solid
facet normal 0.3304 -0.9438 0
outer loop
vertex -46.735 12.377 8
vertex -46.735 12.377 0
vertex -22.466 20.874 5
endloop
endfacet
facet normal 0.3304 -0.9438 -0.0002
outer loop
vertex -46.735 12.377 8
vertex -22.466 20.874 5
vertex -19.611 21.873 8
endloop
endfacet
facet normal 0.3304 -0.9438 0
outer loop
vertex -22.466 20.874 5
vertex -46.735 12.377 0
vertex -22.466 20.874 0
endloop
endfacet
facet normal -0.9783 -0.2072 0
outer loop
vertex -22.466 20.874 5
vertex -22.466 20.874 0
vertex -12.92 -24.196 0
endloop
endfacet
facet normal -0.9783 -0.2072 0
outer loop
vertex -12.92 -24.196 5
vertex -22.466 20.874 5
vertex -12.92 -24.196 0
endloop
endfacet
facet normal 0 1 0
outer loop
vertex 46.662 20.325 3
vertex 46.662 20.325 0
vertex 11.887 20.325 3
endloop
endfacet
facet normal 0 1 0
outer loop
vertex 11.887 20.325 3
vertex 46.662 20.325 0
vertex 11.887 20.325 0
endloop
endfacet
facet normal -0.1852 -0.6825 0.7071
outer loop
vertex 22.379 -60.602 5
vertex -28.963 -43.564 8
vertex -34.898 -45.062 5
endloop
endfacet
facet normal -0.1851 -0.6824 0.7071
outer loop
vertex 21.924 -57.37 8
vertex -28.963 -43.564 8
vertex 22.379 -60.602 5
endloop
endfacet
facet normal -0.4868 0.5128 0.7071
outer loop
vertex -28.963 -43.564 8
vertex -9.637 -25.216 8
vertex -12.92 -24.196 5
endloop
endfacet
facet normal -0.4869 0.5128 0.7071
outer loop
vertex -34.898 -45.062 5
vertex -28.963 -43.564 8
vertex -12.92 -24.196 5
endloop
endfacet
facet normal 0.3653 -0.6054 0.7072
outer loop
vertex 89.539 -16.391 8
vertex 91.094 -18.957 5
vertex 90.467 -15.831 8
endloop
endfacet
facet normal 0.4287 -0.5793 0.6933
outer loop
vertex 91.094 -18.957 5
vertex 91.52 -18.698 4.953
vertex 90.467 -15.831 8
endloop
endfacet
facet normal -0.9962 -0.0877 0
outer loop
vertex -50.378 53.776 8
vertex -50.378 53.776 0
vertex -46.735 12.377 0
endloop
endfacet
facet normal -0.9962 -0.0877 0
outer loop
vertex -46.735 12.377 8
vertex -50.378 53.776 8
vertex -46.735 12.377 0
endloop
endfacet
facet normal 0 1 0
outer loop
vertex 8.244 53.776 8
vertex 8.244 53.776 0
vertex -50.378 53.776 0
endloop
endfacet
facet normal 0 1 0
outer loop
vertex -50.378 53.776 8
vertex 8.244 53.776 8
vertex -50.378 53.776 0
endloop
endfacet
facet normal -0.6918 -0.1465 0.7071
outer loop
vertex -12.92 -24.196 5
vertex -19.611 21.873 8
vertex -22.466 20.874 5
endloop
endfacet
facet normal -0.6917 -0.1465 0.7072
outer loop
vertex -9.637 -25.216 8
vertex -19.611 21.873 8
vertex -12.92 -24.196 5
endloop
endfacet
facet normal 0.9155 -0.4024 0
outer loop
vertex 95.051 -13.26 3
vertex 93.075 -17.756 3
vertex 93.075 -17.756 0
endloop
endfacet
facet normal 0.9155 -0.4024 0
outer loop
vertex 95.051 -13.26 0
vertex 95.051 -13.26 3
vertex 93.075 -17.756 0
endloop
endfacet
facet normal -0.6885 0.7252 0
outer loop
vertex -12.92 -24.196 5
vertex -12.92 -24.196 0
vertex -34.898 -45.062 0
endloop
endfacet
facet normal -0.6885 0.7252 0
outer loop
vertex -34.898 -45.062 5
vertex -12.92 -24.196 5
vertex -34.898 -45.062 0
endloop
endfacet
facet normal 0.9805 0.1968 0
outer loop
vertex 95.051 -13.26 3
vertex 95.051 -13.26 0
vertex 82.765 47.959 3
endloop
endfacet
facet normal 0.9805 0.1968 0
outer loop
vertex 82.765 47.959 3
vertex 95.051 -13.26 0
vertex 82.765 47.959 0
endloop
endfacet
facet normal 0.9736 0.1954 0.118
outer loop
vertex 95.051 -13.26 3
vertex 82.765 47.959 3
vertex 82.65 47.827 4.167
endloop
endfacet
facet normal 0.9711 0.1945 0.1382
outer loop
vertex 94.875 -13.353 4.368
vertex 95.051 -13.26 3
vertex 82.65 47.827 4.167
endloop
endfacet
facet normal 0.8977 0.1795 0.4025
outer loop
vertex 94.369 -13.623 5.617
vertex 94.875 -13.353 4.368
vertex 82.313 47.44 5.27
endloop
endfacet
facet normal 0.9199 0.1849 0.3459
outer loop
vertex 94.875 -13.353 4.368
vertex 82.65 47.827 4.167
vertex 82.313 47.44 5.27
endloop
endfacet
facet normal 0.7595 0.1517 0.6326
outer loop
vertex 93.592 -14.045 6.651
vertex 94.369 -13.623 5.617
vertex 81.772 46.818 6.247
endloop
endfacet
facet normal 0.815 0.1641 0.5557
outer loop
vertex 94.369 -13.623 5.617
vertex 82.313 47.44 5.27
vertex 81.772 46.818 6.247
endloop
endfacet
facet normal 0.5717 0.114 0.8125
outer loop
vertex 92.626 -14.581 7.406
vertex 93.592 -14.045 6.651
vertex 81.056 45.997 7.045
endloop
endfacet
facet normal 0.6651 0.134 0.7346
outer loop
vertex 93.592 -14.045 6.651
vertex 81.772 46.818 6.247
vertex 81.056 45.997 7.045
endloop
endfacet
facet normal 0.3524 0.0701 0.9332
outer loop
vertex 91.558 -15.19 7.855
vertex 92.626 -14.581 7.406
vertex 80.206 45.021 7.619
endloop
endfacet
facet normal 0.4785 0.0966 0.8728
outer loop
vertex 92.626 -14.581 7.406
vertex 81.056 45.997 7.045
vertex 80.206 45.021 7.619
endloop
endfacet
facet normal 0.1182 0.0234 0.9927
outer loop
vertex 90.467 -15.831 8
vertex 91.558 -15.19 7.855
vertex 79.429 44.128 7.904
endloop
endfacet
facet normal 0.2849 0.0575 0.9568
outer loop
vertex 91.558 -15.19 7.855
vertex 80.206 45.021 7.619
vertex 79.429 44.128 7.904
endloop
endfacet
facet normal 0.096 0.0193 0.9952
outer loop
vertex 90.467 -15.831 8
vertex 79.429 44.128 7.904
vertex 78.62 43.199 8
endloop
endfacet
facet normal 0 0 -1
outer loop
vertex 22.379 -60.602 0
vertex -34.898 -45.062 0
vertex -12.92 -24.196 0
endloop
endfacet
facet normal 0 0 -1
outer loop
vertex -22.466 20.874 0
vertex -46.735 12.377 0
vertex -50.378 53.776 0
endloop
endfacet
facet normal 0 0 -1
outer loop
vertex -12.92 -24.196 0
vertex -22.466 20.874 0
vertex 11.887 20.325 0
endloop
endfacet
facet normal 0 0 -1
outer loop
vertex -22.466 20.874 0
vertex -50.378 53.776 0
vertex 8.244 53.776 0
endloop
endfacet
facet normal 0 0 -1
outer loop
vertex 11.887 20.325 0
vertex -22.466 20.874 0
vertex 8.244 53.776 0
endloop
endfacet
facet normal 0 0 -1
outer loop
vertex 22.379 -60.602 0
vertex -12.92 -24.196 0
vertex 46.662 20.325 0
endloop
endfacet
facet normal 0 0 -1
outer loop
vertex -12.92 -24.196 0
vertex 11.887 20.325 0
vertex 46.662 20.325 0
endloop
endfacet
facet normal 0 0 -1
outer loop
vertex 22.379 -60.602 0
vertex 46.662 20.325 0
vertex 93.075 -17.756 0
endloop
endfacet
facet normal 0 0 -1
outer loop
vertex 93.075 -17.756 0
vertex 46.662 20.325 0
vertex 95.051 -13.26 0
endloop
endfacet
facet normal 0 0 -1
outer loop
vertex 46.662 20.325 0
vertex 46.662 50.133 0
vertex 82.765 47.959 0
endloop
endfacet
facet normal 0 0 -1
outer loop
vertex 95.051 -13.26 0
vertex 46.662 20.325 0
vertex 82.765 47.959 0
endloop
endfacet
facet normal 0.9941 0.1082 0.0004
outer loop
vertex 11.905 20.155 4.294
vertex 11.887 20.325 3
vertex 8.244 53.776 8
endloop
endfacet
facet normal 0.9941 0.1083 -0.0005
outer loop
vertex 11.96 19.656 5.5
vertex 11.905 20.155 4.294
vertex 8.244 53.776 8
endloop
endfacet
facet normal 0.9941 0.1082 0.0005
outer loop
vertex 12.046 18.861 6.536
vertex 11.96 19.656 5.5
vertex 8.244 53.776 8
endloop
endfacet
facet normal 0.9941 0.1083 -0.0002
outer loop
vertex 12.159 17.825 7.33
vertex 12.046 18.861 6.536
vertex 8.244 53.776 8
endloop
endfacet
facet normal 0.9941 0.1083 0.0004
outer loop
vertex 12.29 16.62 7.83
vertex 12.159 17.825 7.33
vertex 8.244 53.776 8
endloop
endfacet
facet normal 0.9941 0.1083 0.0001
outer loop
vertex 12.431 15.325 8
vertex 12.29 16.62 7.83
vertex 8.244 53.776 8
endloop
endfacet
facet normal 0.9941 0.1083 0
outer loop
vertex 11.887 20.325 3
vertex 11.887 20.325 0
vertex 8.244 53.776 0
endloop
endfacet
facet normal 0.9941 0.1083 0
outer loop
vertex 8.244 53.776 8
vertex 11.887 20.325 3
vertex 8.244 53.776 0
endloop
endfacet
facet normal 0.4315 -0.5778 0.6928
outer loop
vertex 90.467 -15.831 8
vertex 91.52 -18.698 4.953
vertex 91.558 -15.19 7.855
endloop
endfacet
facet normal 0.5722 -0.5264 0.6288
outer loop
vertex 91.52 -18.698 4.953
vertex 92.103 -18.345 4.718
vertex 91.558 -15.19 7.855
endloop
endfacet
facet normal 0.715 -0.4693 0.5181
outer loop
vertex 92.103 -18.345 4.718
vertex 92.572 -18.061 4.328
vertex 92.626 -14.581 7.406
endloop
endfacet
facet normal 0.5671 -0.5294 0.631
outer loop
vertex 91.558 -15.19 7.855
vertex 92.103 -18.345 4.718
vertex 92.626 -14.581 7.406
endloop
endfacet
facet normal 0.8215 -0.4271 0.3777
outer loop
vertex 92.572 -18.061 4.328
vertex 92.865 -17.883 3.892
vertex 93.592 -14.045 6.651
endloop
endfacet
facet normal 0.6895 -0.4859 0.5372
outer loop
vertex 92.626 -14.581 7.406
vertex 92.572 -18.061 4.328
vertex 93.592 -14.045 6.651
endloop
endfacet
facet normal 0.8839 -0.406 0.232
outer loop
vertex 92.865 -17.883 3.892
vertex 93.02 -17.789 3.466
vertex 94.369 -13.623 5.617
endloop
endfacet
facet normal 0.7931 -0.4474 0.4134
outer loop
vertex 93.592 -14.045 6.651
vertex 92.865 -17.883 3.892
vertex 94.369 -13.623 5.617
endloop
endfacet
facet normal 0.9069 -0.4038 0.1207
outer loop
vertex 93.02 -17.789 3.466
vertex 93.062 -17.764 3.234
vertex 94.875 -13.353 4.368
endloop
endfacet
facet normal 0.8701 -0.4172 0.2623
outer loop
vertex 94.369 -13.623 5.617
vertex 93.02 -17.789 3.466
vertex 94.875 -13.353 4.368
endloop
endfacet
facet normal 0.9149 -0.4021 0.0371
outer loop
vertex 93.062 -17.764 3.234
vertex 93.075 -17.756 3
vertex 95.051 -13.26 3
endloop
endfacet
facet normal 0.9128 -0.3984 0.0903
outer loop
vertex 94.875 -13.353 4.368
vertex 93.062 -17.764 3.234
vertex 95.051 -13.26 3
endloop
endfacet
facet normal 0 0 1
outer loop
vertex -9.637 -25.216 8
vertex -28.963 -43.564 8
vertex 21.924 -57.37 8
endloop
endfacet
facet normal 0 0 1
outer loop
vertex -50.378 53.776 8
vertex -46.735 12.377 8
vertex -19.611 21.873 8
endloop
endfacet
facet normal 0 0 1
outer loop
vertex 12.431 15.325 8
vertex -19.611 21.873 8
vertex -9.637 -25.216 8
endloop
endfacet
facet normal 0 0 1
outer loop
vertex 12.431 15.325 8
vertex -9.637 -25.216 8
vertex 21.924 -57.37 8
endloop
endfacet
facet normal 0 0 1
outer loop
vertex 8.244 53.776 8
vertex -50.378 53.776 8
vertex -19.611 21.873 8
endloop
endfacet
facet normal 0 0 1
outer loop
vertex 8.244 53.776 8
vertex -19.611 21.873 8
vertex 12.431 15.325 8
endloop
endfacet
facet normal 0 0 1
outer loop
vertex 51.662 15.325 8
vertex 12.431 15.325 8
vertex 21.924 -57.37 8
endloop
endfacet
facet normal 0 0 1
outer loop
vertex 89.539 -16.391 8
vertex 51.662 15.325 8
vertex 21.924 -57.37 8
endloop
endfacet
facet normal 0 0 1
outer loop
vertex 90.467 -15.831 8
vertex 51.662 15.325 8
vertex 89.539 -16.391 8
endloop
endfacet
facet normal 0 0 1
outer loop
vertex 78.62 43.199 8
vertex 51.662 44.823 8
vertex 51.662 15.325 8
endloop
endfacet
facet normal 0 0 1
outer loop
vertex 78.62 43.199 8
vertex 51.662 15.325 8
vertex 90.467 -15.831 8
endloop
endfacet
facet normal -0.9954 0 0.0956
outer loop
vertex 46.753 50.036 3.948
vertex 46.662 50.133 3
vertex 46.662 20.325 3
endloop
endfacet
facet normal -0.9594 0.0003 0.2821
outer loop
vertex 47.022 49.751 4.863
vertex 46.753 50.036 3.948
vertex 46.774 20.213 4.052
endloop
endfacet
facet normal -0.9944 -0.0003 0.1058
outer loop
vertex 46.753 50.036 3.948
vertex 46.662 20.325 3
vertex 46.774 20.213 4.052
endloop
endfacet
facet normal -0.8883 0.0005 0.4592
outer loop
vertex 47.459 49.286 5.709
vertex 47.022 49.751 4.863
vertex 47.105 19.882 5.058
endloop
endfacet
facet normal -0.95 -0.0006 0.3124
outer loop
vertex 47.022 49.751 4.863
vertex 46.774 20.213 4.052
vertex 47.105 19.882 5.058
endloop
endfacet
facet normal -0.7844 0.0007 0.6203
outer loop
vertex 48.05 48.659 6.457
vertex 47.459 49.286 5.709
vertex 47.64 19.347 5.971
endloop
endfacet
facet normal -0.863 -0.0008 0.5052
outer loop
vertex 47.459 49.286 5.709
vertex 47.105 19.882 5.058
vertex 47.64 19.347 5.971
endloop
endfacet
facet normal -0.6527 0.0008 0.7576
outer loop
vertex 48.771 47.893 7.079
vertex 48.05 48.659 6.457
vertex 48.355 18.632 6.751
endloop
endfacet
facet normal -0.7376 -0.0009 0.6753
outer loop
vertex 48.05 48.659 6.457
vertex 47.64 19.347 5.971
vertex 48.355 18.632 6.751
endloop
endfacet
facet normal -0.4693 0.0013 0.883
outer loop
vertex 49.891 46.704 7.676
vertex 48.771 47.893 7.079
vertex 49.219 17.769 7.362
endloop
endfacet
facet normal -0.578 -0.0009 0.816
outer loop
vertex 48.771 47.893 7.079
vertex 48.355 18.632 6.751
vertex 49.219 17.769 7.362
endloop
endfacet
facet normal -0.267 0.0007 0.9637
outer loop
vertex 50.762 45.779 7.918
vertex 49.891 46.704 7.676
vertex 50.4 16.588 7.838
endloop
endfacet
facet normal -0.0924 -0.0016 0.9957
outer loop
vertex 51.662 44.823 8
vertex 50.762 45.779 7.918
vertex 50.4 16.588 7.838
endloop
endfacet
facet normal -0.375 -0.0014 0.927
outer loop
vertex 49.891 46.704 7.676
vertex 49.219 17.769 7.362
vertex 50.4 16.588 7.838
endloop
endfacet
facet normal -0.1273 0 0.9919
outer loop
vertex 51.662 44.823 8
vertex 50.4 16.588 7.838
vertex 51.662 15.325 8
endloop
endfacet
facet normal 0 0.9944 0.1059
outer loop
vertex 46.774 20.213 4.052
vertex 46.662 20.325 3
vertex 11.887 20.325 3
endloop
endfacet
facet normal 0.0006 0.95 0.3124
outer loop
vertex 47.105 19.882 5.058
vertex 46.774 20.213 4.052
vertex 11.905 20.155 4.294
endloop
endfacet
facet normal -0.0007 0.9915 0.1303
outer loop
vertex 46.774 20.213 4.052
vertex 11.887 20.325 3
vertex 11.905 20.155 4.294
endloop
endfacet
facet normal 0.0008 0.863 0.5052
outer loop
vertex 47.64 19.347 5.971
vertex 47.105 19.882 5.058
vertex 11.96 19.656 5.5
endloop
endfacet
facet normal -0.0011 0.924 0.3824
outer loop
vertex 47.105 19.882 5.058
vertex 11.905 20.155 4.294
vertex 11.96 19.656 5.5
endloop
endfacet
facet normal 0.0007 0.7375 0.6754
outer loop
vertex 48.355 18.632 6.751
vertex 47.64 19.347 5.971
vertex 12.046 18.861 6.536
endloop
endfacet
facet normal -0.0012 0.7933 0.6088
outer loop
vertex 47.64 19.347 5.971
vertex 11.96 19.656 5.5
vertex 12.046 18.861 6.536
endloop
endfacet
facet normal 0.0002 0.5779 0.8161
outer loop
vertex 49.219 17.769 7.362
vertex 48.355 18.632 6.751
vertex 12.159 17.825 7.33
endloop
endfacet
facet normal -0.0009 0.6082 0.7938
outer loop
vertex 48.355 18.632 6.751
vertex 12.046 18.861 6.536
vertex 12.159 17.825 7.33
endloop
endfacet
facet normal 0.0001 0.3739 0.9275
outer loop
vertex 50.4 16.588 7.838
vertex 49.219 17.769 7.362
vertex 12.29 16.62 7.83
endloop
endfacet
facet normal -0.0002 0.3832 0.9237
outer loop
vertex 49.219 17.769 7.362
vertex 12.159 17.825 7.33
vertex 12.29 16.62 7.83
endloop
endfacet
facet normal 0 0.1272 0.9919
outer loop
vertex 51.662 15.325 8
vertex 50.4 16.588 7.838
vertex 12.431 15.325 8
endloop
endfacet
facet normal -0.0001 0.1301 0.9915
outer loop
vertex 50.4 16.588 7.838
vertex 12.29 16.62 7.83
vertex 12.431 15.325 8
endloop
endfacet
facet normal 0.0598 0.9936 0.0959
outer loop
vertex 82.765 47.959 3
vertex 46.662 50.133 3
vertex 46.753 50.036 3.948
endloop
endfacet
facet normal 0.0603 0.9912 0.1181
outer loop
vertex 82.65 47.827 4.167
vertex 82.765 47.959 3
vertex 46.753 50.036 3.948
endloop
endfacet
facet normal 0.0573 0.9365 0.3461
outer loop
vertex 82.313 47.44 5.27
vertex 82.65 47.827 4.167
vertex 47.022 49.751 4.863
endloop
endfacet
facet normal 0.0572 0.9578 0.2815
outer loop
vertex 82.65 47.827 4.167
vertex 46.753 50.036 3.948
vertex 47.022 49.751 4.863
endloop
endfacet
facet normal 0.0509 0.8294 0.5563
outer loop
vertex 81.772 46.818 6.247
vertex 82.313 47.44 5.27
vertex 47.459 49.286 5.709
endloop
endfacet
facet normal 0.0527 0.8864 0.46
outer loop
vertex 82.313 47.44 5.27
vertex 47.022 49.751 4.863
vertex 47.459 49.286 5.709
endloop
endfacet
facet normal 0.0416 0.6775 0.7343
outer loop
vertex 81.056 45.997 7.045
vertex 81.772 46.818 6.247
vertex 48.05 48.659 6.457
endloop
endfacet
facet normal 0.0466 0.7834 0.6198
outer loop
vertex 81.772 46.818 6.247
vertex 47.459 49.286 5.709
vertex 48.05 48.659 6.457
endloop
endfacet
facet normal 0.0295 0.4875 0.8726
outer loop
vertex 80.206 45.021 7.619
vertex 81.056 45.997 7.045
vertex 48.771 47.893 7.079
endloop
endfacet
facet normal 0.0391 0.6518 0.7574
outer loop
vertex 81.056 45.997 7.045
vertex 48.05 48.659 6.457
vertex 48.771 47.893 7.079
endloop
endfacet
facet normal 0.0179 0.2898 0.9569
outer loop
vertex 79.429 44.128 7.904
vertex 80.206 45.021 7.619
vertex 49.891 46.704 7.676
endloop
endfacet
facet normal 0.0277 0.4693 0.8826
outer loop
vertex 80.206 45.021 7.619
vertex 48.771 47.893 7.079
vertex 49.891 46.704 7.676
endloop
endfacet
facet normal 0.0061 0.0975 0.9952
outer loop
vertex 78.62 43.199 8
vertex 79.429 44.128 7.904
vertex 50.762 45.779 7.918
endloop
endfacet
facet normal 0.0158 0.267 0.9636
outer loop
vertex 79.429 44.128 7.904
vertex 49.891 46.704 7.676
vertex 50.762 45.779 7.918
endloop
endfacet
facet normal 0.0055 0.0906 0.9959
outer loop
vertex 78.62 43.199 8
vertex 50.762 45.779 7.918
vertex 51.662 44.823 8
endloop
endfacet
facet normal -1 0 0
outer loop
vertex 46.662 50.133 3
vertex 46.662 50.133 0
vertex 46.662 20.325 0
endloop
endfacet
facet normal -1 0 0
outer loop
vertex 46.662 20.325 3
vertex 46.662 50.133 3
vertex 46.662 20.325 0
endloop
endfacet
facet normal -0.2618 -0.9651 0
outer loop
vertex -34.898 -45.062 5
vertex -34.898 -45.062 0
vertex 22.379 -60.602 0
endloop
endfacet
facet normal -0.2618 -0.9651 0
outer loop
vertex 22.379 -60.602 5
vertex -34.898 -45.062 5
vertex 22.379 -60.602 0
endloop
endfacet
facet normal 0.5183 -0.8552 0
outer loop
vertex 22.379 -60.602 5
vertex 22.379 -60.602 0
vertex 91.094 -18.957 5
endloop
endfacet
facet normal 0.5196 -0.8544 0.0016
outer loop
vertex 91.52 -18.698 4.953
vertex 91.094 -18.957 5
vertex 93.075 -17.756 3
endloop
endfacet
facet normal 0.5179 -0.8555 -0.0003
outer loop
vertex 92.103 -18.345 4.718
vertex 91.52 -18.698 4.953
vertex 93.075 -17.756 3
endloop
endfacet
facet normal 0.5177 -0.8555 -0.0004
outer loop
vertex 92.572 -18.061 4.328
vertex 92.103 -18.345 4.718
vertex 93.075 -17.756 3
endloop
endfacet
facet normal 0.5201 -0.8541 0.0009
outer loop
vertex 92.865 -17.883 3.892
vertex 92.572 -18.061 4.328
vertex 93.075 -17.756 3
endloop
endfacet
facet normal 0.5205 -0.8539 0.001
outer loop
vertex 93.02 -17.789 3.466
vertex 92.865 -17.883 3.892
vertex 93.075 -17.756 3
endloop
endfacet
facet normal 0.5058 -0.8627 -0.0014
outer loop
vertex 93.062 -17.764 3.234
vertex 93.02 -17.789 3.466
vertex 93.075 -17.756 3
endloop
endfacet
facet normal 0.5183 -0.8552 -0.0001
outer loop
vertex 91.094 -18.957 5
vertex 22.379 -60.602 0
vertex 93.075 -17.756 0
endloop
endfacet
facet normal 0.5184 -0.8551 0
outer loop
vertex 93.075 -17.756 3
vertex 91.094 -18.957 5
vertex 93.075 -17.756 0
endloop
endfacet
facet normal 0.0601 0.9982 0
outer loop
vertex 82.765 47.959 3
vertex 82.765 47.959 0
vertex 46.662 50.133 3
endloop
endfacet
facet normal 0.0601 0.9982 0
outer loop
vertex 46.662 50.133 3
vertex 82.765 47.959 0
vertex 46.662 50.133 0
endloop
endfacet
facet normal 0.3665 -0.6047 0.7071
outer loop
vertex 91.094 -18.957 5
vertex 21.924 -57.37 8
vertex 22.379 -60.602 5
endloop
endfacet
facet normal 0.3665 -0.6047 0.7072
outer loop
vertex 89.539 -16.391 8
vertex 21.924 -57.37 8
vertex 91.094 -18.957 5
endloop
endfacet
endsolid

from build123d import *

# Parameters (mm, degrees)
PAD_DEPTH    = 8
FILLET_R     = 5
CHAMFER_SIZE = 3


with BuildPart() as part:
    # Sketch → Pad (new body)
    with BuildSketch(Plane.XY):
        Polygon((-46.734573, 12.37682), (-22.466158, 20.873907), (-12.919914, -24.196195), (-34.898476, -45.061794), (22.378998, -60.602196), (95.640884, -16.201052), (82.764542, 47.958603), (46.662025, 50.132896), (46.662025, 20.325462), (11.88671, 20.325462), (8.24356, 53.776024), (-50.377705, 53.776024), align=None)
    extrude(amount=PAD_DEPTH)

    # Fillet
    fillet_edges = [part.edges().sort_by_distance(p)[0] for p in [
        (29.274368, 20.325462, 8),
        (46.662025, 35.229179, 8),
        (64.713284, 49.045749, 8),
        (89.202713, 15.878775, 8),
    ]]
    fillet(fillet_edges, radius=FILLET_R)

    # Chamfer
    chamfer_edges = [part.edges().sort_by_distance(p)[0] for p in [
        (56.736601, -39.779406, 8),
        (-6.259739, -52.831995, 8),
        (-23.909195, -34.628995, 8),
        (-17.693036, -1.661144, 8),
    ]]
    chamfer(chamfer_edges, length=CHAMFER_SIZE)


solid = part.part
